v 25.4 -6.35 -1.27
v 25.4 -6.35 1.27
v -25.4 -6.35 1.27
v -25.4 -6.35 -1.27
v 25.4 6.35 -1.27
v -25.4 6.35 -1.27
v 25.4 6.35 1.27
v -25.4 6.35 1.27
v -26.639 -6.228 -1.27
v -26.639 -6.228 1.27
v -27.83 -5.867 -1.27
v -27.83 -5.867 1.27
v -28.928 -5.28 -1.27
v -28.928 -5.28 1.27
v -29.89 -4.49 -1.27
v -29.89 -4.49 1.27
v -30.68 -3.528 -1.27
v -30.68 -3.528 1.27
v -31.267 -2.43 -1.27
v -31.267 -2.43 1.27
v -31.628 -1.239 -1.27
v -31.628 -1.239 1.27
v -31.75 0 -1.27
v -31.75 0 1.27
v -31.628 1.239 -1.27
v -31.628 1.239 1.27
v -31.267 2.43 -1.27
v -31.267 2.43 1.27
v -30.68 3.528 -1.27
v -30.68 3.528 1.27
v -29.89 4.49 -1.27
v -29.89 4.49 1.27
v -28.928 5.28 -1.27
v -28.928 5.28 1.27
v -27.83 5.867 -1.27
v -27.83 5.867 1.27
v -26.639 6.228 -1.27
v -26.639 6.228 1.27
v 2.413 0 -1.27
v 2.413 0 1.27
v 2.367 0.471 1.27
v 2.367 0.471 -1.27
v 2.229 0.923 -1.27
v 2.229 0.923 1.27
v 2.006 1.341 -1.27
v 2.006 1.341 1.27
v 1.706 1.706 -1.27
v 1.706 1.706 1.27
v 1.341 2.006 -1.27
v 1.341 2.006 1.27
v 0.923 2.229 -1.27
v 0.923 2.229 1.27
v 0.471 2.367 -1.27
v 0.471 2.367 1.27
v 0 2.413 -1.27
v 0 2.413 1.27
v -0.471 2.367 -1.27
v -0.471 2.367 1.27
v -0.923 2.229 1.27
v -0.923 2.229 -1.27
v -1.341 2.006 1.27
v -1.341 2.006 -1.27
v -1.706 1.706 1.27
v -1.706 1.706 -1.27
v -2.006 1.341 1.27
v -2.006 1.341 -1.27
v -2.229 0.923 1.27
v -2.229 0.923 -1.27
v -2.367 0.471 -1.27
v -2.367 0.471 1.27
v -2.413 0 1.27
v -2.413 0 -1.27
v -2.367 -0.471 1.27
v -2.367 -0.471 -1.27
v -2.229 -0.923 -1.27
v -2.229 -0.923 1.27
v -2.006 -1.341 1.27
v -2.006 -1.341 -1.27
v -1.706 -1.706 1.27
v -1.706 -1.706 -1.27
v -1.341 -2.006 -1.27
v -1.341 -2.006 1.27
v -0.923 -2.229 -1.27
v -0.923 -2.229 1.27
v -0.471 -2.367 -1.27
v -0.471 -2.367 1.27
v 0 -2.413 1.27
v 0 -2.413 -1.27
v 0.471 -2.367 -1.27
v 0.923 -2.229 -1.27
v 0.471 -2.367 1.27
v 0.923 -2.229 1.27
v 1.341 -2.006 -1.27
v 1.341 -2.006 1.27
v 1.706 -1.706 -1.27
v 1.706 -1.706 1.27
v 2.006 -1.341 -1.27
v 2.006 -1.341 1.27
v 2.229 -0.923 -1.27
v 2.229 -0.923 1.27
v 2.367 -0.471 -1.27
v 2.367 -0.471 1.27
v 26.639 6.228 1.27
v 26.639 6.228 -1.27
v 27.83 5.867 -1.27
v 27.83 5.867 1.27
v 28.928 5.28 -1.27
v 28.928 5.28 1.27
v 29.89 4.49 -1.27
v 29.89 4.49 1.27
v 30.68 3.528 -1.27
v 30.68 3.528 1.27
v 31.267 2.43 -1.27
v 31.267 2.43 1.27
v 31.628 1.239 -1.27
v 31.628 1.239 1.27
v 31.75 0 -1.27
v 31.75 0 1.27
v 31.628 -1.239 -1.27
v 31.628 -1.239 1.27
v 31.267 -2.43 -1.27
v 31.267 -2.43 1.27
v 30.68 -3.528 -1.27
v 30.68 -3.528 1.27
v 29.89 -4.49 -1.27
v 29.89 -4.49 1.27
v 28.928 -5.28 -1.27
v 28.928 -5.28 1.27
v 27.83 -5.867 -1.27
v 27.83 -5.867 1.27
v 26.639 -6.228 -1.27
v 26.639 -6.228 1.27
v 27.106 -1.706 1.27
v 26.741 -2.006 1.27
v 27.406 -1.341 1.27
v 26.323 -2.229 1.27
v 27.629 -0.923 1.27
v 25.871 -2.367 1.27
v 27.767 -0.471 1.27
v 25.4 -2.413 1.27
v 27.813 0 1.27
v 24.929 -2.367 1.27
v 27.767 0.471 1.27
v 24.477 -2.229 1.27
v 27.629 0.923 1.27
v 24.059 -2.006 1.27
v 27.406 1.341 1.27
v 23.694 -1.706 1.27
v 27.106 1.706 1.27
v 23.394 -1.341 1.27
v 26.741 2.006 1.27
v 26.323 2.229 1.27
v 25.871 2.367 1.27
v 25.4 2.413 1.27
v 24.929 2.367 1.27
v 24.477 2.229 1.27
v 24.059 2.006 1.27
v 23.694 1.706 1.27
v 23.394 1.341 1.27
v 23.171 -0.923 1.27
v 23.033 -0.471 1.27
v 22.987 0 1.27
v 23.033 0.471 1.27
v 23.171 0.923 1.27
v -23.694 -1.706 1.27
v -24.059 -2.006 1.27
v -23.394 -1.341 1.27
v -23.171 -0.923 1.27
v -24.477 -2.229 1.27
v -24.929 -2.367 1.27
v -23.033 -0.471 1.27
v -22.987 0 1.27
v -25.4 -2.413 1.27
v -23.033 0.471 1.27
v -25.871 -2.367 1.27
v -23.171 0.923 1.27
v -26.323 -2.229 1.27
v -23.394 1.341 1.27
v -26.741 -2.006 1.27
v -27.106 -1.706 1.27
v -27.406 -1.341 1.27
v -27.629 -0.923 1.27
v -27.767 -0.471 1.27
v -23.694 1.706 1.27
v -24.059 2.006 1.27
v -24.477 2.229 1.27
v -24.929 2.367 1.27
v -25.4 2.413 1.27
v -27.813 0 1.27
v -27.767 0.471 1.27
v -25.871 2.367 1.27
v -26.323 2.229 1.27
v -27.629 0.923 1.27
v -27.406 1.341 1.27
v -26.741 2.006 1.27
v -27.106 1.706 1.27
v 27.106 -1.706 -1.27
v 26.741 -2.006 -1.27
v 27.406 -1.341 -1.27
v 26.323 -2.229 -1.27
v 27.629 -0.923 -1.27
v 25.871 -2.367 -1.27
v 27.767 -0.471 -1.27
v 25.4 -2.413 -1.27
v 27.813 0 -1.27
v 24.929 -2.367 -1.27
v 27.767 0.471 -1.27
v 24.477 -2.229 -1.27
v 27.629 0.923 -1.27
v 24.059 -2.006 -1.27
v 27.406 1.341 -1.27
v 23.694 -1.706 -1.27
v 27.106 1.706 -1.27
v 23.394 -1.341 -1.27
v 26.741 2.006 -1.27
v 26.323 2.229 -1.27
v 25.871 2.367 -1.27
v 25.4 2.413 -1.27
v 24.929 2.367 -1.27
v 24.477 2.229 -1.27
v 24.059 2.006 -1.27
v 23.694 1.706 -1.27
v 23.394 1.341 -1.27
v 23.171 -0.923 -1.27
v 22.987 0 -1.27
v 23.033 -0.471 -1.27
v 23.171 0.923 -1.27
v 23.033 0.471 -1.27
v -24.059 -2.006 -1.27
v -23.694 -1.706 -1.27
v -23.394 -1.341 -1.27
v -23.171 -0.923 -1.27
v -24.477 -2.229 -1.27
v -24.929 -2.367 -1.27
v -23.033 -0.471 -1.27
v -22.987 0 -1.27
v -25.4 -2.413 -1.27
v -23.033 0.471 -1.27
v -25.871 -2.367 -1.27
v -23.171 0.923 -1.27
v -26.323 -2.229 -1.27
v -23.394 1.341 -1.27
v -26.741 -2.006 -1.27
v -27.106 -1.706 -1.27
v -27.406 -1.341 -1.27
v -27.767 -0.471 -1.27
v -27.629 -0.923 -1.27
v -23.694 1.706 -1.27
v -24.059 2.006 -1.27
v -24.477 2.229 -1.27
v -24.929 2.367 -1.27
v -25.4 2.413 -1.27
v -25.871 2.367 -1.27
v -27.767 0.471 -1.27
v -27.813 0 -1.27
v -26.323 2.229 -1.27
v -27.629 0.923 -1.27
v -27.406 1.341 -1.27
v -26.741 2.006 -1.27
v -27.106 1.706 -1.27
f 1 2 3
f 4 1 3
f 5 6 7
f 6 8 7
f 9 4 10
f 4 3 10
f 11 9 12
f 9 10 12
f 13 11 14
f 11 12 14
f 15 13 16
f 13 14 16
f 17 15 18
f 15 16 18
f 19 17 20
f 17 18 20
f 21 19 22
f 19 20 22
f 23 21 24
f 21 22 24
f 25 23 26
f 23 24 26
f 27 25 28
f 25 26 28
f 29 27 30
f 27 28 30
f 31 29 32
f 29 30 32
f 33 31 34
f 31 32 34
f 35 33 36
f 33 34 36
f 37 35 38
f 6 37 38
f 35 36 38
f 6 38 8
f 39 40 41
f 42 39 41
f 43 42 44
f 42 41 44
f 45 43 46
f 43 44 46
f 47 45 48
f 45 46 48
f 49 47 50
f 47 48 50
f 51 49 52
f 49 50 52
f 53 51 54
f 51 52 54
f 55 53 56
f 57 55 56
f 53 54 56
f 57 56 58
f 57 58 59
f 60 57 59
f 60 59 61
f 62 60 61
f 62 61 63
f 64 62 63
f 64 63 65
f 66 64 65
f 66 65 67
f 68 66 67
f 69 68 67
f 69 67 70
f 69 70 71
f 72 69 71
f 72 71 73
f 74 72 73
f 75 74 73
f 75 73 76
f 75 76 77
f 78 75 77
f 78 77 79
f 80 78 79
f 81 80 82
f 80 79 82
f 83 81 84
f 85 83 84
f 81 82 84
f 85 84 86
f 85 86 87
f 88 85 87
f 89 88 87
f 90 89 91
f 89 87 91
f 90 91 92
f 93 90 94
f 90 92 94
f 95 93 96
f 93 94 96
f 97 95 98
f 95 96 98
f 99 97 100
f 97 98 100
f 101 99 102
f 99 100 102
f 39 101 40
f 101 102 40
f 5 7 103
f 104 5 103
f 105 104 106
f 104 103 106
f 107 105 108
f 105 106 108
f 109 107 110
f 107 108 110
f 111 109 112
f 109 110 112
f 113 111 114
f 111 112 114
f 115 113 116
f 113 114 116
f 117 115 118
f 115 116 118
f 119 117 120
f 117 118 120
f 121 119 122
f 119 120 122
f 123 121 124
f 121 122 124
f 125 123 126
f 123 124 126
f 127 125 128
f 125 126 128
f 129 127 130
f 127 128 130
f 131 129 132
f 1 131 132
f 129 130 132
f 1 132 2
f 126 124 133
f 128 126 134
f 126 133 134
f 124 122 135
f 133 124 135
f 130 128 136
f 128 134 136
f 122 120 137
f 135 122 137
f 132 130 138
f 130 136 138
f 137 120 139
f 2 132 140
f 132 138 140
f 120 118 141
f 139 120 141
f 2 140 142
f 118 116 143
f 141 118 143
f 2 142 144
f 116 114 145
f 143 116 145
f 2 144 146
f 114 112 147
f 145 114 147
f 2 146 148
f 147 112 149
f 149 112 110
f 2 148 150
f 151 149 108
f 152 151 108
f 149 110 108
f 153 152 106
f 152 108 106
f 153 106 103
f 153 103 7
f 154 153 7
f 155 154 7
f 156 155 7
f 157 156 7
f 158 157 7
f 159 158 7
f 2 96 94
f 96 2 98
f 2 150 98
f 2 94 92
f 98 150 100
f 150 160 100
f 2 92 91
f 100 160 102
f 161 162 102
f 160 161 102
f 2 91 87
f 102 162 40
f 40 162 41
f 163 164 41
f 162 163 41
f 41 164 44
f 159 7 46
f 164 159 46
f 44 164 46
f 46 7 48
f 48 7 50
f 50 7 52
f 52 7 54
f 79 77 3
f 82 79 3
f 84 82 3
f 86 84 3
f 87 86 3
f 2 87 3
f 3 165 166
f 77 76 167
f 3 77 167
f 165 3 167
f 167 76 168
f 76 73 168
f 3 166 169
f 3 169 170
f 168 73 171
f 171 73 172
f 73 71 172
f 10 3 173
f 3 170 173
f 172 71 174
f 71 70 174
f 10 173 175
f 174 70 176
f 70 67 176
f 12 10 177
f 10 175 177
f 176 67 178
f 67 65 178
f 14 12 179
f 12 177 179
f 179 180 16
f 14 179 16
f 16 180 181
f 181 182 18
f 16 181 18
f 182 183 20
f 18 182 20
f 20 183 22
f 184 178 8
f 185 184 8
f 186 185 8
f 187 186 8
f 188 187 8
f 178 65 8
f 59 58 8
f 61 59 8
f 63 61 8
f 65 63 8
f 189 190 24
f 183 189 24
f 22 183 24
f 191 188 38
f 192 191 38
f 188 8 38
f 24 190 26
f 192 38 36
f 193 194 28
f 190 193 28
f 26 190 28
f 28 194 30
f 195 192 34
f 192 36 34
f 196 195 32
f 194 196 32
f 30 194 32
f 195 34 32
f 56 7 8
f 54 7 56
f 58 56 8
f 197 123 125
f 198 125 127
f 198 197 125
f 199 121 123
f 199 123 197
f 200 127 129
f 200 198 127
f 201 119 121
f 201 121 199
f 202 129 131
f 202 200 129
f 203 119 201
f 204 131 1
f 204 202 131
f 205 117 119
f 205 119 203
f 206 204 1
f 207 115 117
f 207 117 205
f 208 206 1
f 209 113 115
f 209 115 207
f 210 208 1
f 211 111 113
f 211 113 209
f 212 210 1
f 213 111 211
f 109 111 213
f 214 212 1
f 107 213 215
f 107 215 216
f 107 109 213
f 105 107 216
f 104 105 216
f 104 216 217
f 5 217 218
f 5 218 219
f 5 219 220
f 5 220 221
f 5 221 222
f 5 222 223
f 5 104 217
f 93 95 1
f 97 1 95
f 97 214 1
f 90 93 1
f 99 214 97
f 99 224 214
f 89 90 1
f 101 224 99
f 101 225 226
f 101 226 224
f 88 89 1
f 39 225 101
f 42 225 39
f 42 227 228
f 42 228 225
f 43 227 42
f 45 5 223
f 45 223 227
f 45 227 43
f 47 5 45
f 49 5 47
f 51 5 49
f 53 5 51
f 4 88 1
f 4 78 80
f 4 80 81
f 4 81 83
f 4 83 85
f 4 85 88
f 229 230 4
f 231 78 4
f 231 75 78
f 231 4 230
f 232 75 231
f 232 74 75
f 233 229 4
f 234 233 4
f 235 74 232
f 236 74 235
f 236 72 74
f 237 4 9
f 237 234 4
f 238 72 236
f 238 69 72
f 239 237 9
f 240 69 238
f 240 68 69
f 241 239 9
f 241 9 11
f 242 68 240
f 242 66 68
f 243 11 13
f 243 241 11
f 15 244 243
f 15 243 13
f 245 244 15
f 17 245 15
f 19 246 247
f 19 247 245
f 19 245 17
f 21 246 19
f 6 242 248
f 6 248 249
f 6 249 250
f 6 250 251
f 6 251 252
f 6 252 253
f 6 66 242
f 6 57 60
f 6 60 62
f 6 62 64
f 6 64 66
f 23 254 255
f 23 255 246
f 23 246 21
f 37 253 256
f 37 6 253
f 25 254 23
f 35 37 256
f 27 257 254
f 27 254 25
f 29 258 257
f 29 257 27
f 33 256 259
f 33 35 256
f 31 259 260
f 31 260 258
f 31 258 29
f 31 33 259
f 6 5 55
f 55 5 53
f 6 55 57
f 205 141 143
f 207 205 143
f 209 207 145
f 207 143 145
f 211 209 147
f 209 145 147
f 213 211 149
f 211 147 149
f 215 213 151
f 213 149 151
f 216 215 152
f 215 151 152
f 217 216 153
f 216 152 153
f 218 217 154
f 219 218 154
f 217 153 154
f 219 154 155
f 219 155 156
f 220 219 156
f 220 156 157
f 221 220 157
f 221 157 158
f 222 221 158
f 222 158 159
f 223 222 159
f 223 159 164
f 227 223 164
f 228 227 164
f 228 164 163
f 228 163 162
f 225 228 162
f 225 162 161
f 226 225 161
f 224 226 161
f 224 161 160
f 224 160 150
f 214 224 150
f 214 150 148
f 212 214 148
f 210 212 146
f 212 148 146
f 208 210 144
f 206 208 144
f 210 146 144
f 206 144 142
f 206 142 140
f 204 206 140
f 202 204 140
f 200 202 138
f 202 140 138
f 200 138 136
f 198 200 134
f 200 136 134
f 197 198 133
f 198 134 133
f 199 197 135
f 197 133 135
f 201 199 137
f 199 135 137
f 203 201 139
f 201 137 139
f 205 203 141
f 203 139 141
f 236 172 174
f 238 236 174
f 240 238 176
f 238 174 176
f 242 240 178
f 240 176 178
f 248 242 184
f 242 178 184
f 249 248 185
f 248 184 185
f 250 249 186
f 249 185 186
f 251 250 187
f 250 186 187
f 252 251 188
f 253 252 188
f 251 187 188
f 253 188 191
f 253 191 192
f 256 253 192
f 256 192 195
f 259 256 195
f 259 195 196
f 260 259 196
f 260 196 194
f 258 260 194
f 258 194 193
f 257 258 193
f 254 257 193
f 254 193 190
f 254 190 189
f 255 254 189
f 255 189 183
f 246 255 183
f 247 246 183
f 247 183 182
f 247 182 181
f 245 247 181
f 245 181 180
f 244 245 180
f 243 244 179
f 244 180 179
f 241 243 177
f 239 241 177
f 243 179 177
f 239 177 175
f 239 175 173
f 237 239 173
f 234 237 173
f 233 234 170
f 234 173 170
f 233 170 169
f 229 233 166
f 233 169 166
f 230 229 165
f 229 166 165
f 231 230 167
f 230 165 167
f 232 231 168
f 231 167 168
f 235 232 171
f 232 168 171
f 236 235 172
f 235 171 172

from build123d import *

# Parameters (mm, degrees)
SALIENTE_EXTRUIR1_DEPTH = 1.27
CROQUIS2_R              = 2.413
CORTAR_EXTRUIR1_DEPTH   = 33.478248105
MATRIZL1_COUNT          = 3
MATRIZL1_PITCH          = 25.4


with BuildPart() as part:
    # Croquis1 → Saliente-Extruir1 (new, symmetric)
    with BuildSketch(Plane.XY):
        with BuildLine():
            Line((25.4, -6.35), (-25.4, -6.35))
            ThreePointArc((-25.4, -6.35), (-31.75, 0), (-25.4, 6.35))
            Line((-25.4, 6.35), (25.4, 6.35))
            ThreePointArc((25.4, 6.35), (31.75, 0), (25.4, -6.35))
        make_face()
    extrude(amount=SALIENTE_EXTRUIR1_DEPTH, both=True)

    # Croquis2 → Cortar-Extruir1 (cut, through all)
    with BuildSketch(Plane.XY.offset(1.27)):
        with Locations((-25.4, 0)):
            Circle(CROQUIS2_R)
    cortar_extruir1 = extrude(amount=-CORTAR_EXTRUIR1_DEPTH, mode=Mode.SUBTRACT)

    # MatrizL1: Cortar-Extruir1 ×3
    with Locations(*[(i * MATRIZL1_PITCH, 0, 0) for i in range(1, MATRIZL1_COUNT)]):
        add(cortar_extruir1, mode=Mode.SUBTRACT)


solid = part.part
